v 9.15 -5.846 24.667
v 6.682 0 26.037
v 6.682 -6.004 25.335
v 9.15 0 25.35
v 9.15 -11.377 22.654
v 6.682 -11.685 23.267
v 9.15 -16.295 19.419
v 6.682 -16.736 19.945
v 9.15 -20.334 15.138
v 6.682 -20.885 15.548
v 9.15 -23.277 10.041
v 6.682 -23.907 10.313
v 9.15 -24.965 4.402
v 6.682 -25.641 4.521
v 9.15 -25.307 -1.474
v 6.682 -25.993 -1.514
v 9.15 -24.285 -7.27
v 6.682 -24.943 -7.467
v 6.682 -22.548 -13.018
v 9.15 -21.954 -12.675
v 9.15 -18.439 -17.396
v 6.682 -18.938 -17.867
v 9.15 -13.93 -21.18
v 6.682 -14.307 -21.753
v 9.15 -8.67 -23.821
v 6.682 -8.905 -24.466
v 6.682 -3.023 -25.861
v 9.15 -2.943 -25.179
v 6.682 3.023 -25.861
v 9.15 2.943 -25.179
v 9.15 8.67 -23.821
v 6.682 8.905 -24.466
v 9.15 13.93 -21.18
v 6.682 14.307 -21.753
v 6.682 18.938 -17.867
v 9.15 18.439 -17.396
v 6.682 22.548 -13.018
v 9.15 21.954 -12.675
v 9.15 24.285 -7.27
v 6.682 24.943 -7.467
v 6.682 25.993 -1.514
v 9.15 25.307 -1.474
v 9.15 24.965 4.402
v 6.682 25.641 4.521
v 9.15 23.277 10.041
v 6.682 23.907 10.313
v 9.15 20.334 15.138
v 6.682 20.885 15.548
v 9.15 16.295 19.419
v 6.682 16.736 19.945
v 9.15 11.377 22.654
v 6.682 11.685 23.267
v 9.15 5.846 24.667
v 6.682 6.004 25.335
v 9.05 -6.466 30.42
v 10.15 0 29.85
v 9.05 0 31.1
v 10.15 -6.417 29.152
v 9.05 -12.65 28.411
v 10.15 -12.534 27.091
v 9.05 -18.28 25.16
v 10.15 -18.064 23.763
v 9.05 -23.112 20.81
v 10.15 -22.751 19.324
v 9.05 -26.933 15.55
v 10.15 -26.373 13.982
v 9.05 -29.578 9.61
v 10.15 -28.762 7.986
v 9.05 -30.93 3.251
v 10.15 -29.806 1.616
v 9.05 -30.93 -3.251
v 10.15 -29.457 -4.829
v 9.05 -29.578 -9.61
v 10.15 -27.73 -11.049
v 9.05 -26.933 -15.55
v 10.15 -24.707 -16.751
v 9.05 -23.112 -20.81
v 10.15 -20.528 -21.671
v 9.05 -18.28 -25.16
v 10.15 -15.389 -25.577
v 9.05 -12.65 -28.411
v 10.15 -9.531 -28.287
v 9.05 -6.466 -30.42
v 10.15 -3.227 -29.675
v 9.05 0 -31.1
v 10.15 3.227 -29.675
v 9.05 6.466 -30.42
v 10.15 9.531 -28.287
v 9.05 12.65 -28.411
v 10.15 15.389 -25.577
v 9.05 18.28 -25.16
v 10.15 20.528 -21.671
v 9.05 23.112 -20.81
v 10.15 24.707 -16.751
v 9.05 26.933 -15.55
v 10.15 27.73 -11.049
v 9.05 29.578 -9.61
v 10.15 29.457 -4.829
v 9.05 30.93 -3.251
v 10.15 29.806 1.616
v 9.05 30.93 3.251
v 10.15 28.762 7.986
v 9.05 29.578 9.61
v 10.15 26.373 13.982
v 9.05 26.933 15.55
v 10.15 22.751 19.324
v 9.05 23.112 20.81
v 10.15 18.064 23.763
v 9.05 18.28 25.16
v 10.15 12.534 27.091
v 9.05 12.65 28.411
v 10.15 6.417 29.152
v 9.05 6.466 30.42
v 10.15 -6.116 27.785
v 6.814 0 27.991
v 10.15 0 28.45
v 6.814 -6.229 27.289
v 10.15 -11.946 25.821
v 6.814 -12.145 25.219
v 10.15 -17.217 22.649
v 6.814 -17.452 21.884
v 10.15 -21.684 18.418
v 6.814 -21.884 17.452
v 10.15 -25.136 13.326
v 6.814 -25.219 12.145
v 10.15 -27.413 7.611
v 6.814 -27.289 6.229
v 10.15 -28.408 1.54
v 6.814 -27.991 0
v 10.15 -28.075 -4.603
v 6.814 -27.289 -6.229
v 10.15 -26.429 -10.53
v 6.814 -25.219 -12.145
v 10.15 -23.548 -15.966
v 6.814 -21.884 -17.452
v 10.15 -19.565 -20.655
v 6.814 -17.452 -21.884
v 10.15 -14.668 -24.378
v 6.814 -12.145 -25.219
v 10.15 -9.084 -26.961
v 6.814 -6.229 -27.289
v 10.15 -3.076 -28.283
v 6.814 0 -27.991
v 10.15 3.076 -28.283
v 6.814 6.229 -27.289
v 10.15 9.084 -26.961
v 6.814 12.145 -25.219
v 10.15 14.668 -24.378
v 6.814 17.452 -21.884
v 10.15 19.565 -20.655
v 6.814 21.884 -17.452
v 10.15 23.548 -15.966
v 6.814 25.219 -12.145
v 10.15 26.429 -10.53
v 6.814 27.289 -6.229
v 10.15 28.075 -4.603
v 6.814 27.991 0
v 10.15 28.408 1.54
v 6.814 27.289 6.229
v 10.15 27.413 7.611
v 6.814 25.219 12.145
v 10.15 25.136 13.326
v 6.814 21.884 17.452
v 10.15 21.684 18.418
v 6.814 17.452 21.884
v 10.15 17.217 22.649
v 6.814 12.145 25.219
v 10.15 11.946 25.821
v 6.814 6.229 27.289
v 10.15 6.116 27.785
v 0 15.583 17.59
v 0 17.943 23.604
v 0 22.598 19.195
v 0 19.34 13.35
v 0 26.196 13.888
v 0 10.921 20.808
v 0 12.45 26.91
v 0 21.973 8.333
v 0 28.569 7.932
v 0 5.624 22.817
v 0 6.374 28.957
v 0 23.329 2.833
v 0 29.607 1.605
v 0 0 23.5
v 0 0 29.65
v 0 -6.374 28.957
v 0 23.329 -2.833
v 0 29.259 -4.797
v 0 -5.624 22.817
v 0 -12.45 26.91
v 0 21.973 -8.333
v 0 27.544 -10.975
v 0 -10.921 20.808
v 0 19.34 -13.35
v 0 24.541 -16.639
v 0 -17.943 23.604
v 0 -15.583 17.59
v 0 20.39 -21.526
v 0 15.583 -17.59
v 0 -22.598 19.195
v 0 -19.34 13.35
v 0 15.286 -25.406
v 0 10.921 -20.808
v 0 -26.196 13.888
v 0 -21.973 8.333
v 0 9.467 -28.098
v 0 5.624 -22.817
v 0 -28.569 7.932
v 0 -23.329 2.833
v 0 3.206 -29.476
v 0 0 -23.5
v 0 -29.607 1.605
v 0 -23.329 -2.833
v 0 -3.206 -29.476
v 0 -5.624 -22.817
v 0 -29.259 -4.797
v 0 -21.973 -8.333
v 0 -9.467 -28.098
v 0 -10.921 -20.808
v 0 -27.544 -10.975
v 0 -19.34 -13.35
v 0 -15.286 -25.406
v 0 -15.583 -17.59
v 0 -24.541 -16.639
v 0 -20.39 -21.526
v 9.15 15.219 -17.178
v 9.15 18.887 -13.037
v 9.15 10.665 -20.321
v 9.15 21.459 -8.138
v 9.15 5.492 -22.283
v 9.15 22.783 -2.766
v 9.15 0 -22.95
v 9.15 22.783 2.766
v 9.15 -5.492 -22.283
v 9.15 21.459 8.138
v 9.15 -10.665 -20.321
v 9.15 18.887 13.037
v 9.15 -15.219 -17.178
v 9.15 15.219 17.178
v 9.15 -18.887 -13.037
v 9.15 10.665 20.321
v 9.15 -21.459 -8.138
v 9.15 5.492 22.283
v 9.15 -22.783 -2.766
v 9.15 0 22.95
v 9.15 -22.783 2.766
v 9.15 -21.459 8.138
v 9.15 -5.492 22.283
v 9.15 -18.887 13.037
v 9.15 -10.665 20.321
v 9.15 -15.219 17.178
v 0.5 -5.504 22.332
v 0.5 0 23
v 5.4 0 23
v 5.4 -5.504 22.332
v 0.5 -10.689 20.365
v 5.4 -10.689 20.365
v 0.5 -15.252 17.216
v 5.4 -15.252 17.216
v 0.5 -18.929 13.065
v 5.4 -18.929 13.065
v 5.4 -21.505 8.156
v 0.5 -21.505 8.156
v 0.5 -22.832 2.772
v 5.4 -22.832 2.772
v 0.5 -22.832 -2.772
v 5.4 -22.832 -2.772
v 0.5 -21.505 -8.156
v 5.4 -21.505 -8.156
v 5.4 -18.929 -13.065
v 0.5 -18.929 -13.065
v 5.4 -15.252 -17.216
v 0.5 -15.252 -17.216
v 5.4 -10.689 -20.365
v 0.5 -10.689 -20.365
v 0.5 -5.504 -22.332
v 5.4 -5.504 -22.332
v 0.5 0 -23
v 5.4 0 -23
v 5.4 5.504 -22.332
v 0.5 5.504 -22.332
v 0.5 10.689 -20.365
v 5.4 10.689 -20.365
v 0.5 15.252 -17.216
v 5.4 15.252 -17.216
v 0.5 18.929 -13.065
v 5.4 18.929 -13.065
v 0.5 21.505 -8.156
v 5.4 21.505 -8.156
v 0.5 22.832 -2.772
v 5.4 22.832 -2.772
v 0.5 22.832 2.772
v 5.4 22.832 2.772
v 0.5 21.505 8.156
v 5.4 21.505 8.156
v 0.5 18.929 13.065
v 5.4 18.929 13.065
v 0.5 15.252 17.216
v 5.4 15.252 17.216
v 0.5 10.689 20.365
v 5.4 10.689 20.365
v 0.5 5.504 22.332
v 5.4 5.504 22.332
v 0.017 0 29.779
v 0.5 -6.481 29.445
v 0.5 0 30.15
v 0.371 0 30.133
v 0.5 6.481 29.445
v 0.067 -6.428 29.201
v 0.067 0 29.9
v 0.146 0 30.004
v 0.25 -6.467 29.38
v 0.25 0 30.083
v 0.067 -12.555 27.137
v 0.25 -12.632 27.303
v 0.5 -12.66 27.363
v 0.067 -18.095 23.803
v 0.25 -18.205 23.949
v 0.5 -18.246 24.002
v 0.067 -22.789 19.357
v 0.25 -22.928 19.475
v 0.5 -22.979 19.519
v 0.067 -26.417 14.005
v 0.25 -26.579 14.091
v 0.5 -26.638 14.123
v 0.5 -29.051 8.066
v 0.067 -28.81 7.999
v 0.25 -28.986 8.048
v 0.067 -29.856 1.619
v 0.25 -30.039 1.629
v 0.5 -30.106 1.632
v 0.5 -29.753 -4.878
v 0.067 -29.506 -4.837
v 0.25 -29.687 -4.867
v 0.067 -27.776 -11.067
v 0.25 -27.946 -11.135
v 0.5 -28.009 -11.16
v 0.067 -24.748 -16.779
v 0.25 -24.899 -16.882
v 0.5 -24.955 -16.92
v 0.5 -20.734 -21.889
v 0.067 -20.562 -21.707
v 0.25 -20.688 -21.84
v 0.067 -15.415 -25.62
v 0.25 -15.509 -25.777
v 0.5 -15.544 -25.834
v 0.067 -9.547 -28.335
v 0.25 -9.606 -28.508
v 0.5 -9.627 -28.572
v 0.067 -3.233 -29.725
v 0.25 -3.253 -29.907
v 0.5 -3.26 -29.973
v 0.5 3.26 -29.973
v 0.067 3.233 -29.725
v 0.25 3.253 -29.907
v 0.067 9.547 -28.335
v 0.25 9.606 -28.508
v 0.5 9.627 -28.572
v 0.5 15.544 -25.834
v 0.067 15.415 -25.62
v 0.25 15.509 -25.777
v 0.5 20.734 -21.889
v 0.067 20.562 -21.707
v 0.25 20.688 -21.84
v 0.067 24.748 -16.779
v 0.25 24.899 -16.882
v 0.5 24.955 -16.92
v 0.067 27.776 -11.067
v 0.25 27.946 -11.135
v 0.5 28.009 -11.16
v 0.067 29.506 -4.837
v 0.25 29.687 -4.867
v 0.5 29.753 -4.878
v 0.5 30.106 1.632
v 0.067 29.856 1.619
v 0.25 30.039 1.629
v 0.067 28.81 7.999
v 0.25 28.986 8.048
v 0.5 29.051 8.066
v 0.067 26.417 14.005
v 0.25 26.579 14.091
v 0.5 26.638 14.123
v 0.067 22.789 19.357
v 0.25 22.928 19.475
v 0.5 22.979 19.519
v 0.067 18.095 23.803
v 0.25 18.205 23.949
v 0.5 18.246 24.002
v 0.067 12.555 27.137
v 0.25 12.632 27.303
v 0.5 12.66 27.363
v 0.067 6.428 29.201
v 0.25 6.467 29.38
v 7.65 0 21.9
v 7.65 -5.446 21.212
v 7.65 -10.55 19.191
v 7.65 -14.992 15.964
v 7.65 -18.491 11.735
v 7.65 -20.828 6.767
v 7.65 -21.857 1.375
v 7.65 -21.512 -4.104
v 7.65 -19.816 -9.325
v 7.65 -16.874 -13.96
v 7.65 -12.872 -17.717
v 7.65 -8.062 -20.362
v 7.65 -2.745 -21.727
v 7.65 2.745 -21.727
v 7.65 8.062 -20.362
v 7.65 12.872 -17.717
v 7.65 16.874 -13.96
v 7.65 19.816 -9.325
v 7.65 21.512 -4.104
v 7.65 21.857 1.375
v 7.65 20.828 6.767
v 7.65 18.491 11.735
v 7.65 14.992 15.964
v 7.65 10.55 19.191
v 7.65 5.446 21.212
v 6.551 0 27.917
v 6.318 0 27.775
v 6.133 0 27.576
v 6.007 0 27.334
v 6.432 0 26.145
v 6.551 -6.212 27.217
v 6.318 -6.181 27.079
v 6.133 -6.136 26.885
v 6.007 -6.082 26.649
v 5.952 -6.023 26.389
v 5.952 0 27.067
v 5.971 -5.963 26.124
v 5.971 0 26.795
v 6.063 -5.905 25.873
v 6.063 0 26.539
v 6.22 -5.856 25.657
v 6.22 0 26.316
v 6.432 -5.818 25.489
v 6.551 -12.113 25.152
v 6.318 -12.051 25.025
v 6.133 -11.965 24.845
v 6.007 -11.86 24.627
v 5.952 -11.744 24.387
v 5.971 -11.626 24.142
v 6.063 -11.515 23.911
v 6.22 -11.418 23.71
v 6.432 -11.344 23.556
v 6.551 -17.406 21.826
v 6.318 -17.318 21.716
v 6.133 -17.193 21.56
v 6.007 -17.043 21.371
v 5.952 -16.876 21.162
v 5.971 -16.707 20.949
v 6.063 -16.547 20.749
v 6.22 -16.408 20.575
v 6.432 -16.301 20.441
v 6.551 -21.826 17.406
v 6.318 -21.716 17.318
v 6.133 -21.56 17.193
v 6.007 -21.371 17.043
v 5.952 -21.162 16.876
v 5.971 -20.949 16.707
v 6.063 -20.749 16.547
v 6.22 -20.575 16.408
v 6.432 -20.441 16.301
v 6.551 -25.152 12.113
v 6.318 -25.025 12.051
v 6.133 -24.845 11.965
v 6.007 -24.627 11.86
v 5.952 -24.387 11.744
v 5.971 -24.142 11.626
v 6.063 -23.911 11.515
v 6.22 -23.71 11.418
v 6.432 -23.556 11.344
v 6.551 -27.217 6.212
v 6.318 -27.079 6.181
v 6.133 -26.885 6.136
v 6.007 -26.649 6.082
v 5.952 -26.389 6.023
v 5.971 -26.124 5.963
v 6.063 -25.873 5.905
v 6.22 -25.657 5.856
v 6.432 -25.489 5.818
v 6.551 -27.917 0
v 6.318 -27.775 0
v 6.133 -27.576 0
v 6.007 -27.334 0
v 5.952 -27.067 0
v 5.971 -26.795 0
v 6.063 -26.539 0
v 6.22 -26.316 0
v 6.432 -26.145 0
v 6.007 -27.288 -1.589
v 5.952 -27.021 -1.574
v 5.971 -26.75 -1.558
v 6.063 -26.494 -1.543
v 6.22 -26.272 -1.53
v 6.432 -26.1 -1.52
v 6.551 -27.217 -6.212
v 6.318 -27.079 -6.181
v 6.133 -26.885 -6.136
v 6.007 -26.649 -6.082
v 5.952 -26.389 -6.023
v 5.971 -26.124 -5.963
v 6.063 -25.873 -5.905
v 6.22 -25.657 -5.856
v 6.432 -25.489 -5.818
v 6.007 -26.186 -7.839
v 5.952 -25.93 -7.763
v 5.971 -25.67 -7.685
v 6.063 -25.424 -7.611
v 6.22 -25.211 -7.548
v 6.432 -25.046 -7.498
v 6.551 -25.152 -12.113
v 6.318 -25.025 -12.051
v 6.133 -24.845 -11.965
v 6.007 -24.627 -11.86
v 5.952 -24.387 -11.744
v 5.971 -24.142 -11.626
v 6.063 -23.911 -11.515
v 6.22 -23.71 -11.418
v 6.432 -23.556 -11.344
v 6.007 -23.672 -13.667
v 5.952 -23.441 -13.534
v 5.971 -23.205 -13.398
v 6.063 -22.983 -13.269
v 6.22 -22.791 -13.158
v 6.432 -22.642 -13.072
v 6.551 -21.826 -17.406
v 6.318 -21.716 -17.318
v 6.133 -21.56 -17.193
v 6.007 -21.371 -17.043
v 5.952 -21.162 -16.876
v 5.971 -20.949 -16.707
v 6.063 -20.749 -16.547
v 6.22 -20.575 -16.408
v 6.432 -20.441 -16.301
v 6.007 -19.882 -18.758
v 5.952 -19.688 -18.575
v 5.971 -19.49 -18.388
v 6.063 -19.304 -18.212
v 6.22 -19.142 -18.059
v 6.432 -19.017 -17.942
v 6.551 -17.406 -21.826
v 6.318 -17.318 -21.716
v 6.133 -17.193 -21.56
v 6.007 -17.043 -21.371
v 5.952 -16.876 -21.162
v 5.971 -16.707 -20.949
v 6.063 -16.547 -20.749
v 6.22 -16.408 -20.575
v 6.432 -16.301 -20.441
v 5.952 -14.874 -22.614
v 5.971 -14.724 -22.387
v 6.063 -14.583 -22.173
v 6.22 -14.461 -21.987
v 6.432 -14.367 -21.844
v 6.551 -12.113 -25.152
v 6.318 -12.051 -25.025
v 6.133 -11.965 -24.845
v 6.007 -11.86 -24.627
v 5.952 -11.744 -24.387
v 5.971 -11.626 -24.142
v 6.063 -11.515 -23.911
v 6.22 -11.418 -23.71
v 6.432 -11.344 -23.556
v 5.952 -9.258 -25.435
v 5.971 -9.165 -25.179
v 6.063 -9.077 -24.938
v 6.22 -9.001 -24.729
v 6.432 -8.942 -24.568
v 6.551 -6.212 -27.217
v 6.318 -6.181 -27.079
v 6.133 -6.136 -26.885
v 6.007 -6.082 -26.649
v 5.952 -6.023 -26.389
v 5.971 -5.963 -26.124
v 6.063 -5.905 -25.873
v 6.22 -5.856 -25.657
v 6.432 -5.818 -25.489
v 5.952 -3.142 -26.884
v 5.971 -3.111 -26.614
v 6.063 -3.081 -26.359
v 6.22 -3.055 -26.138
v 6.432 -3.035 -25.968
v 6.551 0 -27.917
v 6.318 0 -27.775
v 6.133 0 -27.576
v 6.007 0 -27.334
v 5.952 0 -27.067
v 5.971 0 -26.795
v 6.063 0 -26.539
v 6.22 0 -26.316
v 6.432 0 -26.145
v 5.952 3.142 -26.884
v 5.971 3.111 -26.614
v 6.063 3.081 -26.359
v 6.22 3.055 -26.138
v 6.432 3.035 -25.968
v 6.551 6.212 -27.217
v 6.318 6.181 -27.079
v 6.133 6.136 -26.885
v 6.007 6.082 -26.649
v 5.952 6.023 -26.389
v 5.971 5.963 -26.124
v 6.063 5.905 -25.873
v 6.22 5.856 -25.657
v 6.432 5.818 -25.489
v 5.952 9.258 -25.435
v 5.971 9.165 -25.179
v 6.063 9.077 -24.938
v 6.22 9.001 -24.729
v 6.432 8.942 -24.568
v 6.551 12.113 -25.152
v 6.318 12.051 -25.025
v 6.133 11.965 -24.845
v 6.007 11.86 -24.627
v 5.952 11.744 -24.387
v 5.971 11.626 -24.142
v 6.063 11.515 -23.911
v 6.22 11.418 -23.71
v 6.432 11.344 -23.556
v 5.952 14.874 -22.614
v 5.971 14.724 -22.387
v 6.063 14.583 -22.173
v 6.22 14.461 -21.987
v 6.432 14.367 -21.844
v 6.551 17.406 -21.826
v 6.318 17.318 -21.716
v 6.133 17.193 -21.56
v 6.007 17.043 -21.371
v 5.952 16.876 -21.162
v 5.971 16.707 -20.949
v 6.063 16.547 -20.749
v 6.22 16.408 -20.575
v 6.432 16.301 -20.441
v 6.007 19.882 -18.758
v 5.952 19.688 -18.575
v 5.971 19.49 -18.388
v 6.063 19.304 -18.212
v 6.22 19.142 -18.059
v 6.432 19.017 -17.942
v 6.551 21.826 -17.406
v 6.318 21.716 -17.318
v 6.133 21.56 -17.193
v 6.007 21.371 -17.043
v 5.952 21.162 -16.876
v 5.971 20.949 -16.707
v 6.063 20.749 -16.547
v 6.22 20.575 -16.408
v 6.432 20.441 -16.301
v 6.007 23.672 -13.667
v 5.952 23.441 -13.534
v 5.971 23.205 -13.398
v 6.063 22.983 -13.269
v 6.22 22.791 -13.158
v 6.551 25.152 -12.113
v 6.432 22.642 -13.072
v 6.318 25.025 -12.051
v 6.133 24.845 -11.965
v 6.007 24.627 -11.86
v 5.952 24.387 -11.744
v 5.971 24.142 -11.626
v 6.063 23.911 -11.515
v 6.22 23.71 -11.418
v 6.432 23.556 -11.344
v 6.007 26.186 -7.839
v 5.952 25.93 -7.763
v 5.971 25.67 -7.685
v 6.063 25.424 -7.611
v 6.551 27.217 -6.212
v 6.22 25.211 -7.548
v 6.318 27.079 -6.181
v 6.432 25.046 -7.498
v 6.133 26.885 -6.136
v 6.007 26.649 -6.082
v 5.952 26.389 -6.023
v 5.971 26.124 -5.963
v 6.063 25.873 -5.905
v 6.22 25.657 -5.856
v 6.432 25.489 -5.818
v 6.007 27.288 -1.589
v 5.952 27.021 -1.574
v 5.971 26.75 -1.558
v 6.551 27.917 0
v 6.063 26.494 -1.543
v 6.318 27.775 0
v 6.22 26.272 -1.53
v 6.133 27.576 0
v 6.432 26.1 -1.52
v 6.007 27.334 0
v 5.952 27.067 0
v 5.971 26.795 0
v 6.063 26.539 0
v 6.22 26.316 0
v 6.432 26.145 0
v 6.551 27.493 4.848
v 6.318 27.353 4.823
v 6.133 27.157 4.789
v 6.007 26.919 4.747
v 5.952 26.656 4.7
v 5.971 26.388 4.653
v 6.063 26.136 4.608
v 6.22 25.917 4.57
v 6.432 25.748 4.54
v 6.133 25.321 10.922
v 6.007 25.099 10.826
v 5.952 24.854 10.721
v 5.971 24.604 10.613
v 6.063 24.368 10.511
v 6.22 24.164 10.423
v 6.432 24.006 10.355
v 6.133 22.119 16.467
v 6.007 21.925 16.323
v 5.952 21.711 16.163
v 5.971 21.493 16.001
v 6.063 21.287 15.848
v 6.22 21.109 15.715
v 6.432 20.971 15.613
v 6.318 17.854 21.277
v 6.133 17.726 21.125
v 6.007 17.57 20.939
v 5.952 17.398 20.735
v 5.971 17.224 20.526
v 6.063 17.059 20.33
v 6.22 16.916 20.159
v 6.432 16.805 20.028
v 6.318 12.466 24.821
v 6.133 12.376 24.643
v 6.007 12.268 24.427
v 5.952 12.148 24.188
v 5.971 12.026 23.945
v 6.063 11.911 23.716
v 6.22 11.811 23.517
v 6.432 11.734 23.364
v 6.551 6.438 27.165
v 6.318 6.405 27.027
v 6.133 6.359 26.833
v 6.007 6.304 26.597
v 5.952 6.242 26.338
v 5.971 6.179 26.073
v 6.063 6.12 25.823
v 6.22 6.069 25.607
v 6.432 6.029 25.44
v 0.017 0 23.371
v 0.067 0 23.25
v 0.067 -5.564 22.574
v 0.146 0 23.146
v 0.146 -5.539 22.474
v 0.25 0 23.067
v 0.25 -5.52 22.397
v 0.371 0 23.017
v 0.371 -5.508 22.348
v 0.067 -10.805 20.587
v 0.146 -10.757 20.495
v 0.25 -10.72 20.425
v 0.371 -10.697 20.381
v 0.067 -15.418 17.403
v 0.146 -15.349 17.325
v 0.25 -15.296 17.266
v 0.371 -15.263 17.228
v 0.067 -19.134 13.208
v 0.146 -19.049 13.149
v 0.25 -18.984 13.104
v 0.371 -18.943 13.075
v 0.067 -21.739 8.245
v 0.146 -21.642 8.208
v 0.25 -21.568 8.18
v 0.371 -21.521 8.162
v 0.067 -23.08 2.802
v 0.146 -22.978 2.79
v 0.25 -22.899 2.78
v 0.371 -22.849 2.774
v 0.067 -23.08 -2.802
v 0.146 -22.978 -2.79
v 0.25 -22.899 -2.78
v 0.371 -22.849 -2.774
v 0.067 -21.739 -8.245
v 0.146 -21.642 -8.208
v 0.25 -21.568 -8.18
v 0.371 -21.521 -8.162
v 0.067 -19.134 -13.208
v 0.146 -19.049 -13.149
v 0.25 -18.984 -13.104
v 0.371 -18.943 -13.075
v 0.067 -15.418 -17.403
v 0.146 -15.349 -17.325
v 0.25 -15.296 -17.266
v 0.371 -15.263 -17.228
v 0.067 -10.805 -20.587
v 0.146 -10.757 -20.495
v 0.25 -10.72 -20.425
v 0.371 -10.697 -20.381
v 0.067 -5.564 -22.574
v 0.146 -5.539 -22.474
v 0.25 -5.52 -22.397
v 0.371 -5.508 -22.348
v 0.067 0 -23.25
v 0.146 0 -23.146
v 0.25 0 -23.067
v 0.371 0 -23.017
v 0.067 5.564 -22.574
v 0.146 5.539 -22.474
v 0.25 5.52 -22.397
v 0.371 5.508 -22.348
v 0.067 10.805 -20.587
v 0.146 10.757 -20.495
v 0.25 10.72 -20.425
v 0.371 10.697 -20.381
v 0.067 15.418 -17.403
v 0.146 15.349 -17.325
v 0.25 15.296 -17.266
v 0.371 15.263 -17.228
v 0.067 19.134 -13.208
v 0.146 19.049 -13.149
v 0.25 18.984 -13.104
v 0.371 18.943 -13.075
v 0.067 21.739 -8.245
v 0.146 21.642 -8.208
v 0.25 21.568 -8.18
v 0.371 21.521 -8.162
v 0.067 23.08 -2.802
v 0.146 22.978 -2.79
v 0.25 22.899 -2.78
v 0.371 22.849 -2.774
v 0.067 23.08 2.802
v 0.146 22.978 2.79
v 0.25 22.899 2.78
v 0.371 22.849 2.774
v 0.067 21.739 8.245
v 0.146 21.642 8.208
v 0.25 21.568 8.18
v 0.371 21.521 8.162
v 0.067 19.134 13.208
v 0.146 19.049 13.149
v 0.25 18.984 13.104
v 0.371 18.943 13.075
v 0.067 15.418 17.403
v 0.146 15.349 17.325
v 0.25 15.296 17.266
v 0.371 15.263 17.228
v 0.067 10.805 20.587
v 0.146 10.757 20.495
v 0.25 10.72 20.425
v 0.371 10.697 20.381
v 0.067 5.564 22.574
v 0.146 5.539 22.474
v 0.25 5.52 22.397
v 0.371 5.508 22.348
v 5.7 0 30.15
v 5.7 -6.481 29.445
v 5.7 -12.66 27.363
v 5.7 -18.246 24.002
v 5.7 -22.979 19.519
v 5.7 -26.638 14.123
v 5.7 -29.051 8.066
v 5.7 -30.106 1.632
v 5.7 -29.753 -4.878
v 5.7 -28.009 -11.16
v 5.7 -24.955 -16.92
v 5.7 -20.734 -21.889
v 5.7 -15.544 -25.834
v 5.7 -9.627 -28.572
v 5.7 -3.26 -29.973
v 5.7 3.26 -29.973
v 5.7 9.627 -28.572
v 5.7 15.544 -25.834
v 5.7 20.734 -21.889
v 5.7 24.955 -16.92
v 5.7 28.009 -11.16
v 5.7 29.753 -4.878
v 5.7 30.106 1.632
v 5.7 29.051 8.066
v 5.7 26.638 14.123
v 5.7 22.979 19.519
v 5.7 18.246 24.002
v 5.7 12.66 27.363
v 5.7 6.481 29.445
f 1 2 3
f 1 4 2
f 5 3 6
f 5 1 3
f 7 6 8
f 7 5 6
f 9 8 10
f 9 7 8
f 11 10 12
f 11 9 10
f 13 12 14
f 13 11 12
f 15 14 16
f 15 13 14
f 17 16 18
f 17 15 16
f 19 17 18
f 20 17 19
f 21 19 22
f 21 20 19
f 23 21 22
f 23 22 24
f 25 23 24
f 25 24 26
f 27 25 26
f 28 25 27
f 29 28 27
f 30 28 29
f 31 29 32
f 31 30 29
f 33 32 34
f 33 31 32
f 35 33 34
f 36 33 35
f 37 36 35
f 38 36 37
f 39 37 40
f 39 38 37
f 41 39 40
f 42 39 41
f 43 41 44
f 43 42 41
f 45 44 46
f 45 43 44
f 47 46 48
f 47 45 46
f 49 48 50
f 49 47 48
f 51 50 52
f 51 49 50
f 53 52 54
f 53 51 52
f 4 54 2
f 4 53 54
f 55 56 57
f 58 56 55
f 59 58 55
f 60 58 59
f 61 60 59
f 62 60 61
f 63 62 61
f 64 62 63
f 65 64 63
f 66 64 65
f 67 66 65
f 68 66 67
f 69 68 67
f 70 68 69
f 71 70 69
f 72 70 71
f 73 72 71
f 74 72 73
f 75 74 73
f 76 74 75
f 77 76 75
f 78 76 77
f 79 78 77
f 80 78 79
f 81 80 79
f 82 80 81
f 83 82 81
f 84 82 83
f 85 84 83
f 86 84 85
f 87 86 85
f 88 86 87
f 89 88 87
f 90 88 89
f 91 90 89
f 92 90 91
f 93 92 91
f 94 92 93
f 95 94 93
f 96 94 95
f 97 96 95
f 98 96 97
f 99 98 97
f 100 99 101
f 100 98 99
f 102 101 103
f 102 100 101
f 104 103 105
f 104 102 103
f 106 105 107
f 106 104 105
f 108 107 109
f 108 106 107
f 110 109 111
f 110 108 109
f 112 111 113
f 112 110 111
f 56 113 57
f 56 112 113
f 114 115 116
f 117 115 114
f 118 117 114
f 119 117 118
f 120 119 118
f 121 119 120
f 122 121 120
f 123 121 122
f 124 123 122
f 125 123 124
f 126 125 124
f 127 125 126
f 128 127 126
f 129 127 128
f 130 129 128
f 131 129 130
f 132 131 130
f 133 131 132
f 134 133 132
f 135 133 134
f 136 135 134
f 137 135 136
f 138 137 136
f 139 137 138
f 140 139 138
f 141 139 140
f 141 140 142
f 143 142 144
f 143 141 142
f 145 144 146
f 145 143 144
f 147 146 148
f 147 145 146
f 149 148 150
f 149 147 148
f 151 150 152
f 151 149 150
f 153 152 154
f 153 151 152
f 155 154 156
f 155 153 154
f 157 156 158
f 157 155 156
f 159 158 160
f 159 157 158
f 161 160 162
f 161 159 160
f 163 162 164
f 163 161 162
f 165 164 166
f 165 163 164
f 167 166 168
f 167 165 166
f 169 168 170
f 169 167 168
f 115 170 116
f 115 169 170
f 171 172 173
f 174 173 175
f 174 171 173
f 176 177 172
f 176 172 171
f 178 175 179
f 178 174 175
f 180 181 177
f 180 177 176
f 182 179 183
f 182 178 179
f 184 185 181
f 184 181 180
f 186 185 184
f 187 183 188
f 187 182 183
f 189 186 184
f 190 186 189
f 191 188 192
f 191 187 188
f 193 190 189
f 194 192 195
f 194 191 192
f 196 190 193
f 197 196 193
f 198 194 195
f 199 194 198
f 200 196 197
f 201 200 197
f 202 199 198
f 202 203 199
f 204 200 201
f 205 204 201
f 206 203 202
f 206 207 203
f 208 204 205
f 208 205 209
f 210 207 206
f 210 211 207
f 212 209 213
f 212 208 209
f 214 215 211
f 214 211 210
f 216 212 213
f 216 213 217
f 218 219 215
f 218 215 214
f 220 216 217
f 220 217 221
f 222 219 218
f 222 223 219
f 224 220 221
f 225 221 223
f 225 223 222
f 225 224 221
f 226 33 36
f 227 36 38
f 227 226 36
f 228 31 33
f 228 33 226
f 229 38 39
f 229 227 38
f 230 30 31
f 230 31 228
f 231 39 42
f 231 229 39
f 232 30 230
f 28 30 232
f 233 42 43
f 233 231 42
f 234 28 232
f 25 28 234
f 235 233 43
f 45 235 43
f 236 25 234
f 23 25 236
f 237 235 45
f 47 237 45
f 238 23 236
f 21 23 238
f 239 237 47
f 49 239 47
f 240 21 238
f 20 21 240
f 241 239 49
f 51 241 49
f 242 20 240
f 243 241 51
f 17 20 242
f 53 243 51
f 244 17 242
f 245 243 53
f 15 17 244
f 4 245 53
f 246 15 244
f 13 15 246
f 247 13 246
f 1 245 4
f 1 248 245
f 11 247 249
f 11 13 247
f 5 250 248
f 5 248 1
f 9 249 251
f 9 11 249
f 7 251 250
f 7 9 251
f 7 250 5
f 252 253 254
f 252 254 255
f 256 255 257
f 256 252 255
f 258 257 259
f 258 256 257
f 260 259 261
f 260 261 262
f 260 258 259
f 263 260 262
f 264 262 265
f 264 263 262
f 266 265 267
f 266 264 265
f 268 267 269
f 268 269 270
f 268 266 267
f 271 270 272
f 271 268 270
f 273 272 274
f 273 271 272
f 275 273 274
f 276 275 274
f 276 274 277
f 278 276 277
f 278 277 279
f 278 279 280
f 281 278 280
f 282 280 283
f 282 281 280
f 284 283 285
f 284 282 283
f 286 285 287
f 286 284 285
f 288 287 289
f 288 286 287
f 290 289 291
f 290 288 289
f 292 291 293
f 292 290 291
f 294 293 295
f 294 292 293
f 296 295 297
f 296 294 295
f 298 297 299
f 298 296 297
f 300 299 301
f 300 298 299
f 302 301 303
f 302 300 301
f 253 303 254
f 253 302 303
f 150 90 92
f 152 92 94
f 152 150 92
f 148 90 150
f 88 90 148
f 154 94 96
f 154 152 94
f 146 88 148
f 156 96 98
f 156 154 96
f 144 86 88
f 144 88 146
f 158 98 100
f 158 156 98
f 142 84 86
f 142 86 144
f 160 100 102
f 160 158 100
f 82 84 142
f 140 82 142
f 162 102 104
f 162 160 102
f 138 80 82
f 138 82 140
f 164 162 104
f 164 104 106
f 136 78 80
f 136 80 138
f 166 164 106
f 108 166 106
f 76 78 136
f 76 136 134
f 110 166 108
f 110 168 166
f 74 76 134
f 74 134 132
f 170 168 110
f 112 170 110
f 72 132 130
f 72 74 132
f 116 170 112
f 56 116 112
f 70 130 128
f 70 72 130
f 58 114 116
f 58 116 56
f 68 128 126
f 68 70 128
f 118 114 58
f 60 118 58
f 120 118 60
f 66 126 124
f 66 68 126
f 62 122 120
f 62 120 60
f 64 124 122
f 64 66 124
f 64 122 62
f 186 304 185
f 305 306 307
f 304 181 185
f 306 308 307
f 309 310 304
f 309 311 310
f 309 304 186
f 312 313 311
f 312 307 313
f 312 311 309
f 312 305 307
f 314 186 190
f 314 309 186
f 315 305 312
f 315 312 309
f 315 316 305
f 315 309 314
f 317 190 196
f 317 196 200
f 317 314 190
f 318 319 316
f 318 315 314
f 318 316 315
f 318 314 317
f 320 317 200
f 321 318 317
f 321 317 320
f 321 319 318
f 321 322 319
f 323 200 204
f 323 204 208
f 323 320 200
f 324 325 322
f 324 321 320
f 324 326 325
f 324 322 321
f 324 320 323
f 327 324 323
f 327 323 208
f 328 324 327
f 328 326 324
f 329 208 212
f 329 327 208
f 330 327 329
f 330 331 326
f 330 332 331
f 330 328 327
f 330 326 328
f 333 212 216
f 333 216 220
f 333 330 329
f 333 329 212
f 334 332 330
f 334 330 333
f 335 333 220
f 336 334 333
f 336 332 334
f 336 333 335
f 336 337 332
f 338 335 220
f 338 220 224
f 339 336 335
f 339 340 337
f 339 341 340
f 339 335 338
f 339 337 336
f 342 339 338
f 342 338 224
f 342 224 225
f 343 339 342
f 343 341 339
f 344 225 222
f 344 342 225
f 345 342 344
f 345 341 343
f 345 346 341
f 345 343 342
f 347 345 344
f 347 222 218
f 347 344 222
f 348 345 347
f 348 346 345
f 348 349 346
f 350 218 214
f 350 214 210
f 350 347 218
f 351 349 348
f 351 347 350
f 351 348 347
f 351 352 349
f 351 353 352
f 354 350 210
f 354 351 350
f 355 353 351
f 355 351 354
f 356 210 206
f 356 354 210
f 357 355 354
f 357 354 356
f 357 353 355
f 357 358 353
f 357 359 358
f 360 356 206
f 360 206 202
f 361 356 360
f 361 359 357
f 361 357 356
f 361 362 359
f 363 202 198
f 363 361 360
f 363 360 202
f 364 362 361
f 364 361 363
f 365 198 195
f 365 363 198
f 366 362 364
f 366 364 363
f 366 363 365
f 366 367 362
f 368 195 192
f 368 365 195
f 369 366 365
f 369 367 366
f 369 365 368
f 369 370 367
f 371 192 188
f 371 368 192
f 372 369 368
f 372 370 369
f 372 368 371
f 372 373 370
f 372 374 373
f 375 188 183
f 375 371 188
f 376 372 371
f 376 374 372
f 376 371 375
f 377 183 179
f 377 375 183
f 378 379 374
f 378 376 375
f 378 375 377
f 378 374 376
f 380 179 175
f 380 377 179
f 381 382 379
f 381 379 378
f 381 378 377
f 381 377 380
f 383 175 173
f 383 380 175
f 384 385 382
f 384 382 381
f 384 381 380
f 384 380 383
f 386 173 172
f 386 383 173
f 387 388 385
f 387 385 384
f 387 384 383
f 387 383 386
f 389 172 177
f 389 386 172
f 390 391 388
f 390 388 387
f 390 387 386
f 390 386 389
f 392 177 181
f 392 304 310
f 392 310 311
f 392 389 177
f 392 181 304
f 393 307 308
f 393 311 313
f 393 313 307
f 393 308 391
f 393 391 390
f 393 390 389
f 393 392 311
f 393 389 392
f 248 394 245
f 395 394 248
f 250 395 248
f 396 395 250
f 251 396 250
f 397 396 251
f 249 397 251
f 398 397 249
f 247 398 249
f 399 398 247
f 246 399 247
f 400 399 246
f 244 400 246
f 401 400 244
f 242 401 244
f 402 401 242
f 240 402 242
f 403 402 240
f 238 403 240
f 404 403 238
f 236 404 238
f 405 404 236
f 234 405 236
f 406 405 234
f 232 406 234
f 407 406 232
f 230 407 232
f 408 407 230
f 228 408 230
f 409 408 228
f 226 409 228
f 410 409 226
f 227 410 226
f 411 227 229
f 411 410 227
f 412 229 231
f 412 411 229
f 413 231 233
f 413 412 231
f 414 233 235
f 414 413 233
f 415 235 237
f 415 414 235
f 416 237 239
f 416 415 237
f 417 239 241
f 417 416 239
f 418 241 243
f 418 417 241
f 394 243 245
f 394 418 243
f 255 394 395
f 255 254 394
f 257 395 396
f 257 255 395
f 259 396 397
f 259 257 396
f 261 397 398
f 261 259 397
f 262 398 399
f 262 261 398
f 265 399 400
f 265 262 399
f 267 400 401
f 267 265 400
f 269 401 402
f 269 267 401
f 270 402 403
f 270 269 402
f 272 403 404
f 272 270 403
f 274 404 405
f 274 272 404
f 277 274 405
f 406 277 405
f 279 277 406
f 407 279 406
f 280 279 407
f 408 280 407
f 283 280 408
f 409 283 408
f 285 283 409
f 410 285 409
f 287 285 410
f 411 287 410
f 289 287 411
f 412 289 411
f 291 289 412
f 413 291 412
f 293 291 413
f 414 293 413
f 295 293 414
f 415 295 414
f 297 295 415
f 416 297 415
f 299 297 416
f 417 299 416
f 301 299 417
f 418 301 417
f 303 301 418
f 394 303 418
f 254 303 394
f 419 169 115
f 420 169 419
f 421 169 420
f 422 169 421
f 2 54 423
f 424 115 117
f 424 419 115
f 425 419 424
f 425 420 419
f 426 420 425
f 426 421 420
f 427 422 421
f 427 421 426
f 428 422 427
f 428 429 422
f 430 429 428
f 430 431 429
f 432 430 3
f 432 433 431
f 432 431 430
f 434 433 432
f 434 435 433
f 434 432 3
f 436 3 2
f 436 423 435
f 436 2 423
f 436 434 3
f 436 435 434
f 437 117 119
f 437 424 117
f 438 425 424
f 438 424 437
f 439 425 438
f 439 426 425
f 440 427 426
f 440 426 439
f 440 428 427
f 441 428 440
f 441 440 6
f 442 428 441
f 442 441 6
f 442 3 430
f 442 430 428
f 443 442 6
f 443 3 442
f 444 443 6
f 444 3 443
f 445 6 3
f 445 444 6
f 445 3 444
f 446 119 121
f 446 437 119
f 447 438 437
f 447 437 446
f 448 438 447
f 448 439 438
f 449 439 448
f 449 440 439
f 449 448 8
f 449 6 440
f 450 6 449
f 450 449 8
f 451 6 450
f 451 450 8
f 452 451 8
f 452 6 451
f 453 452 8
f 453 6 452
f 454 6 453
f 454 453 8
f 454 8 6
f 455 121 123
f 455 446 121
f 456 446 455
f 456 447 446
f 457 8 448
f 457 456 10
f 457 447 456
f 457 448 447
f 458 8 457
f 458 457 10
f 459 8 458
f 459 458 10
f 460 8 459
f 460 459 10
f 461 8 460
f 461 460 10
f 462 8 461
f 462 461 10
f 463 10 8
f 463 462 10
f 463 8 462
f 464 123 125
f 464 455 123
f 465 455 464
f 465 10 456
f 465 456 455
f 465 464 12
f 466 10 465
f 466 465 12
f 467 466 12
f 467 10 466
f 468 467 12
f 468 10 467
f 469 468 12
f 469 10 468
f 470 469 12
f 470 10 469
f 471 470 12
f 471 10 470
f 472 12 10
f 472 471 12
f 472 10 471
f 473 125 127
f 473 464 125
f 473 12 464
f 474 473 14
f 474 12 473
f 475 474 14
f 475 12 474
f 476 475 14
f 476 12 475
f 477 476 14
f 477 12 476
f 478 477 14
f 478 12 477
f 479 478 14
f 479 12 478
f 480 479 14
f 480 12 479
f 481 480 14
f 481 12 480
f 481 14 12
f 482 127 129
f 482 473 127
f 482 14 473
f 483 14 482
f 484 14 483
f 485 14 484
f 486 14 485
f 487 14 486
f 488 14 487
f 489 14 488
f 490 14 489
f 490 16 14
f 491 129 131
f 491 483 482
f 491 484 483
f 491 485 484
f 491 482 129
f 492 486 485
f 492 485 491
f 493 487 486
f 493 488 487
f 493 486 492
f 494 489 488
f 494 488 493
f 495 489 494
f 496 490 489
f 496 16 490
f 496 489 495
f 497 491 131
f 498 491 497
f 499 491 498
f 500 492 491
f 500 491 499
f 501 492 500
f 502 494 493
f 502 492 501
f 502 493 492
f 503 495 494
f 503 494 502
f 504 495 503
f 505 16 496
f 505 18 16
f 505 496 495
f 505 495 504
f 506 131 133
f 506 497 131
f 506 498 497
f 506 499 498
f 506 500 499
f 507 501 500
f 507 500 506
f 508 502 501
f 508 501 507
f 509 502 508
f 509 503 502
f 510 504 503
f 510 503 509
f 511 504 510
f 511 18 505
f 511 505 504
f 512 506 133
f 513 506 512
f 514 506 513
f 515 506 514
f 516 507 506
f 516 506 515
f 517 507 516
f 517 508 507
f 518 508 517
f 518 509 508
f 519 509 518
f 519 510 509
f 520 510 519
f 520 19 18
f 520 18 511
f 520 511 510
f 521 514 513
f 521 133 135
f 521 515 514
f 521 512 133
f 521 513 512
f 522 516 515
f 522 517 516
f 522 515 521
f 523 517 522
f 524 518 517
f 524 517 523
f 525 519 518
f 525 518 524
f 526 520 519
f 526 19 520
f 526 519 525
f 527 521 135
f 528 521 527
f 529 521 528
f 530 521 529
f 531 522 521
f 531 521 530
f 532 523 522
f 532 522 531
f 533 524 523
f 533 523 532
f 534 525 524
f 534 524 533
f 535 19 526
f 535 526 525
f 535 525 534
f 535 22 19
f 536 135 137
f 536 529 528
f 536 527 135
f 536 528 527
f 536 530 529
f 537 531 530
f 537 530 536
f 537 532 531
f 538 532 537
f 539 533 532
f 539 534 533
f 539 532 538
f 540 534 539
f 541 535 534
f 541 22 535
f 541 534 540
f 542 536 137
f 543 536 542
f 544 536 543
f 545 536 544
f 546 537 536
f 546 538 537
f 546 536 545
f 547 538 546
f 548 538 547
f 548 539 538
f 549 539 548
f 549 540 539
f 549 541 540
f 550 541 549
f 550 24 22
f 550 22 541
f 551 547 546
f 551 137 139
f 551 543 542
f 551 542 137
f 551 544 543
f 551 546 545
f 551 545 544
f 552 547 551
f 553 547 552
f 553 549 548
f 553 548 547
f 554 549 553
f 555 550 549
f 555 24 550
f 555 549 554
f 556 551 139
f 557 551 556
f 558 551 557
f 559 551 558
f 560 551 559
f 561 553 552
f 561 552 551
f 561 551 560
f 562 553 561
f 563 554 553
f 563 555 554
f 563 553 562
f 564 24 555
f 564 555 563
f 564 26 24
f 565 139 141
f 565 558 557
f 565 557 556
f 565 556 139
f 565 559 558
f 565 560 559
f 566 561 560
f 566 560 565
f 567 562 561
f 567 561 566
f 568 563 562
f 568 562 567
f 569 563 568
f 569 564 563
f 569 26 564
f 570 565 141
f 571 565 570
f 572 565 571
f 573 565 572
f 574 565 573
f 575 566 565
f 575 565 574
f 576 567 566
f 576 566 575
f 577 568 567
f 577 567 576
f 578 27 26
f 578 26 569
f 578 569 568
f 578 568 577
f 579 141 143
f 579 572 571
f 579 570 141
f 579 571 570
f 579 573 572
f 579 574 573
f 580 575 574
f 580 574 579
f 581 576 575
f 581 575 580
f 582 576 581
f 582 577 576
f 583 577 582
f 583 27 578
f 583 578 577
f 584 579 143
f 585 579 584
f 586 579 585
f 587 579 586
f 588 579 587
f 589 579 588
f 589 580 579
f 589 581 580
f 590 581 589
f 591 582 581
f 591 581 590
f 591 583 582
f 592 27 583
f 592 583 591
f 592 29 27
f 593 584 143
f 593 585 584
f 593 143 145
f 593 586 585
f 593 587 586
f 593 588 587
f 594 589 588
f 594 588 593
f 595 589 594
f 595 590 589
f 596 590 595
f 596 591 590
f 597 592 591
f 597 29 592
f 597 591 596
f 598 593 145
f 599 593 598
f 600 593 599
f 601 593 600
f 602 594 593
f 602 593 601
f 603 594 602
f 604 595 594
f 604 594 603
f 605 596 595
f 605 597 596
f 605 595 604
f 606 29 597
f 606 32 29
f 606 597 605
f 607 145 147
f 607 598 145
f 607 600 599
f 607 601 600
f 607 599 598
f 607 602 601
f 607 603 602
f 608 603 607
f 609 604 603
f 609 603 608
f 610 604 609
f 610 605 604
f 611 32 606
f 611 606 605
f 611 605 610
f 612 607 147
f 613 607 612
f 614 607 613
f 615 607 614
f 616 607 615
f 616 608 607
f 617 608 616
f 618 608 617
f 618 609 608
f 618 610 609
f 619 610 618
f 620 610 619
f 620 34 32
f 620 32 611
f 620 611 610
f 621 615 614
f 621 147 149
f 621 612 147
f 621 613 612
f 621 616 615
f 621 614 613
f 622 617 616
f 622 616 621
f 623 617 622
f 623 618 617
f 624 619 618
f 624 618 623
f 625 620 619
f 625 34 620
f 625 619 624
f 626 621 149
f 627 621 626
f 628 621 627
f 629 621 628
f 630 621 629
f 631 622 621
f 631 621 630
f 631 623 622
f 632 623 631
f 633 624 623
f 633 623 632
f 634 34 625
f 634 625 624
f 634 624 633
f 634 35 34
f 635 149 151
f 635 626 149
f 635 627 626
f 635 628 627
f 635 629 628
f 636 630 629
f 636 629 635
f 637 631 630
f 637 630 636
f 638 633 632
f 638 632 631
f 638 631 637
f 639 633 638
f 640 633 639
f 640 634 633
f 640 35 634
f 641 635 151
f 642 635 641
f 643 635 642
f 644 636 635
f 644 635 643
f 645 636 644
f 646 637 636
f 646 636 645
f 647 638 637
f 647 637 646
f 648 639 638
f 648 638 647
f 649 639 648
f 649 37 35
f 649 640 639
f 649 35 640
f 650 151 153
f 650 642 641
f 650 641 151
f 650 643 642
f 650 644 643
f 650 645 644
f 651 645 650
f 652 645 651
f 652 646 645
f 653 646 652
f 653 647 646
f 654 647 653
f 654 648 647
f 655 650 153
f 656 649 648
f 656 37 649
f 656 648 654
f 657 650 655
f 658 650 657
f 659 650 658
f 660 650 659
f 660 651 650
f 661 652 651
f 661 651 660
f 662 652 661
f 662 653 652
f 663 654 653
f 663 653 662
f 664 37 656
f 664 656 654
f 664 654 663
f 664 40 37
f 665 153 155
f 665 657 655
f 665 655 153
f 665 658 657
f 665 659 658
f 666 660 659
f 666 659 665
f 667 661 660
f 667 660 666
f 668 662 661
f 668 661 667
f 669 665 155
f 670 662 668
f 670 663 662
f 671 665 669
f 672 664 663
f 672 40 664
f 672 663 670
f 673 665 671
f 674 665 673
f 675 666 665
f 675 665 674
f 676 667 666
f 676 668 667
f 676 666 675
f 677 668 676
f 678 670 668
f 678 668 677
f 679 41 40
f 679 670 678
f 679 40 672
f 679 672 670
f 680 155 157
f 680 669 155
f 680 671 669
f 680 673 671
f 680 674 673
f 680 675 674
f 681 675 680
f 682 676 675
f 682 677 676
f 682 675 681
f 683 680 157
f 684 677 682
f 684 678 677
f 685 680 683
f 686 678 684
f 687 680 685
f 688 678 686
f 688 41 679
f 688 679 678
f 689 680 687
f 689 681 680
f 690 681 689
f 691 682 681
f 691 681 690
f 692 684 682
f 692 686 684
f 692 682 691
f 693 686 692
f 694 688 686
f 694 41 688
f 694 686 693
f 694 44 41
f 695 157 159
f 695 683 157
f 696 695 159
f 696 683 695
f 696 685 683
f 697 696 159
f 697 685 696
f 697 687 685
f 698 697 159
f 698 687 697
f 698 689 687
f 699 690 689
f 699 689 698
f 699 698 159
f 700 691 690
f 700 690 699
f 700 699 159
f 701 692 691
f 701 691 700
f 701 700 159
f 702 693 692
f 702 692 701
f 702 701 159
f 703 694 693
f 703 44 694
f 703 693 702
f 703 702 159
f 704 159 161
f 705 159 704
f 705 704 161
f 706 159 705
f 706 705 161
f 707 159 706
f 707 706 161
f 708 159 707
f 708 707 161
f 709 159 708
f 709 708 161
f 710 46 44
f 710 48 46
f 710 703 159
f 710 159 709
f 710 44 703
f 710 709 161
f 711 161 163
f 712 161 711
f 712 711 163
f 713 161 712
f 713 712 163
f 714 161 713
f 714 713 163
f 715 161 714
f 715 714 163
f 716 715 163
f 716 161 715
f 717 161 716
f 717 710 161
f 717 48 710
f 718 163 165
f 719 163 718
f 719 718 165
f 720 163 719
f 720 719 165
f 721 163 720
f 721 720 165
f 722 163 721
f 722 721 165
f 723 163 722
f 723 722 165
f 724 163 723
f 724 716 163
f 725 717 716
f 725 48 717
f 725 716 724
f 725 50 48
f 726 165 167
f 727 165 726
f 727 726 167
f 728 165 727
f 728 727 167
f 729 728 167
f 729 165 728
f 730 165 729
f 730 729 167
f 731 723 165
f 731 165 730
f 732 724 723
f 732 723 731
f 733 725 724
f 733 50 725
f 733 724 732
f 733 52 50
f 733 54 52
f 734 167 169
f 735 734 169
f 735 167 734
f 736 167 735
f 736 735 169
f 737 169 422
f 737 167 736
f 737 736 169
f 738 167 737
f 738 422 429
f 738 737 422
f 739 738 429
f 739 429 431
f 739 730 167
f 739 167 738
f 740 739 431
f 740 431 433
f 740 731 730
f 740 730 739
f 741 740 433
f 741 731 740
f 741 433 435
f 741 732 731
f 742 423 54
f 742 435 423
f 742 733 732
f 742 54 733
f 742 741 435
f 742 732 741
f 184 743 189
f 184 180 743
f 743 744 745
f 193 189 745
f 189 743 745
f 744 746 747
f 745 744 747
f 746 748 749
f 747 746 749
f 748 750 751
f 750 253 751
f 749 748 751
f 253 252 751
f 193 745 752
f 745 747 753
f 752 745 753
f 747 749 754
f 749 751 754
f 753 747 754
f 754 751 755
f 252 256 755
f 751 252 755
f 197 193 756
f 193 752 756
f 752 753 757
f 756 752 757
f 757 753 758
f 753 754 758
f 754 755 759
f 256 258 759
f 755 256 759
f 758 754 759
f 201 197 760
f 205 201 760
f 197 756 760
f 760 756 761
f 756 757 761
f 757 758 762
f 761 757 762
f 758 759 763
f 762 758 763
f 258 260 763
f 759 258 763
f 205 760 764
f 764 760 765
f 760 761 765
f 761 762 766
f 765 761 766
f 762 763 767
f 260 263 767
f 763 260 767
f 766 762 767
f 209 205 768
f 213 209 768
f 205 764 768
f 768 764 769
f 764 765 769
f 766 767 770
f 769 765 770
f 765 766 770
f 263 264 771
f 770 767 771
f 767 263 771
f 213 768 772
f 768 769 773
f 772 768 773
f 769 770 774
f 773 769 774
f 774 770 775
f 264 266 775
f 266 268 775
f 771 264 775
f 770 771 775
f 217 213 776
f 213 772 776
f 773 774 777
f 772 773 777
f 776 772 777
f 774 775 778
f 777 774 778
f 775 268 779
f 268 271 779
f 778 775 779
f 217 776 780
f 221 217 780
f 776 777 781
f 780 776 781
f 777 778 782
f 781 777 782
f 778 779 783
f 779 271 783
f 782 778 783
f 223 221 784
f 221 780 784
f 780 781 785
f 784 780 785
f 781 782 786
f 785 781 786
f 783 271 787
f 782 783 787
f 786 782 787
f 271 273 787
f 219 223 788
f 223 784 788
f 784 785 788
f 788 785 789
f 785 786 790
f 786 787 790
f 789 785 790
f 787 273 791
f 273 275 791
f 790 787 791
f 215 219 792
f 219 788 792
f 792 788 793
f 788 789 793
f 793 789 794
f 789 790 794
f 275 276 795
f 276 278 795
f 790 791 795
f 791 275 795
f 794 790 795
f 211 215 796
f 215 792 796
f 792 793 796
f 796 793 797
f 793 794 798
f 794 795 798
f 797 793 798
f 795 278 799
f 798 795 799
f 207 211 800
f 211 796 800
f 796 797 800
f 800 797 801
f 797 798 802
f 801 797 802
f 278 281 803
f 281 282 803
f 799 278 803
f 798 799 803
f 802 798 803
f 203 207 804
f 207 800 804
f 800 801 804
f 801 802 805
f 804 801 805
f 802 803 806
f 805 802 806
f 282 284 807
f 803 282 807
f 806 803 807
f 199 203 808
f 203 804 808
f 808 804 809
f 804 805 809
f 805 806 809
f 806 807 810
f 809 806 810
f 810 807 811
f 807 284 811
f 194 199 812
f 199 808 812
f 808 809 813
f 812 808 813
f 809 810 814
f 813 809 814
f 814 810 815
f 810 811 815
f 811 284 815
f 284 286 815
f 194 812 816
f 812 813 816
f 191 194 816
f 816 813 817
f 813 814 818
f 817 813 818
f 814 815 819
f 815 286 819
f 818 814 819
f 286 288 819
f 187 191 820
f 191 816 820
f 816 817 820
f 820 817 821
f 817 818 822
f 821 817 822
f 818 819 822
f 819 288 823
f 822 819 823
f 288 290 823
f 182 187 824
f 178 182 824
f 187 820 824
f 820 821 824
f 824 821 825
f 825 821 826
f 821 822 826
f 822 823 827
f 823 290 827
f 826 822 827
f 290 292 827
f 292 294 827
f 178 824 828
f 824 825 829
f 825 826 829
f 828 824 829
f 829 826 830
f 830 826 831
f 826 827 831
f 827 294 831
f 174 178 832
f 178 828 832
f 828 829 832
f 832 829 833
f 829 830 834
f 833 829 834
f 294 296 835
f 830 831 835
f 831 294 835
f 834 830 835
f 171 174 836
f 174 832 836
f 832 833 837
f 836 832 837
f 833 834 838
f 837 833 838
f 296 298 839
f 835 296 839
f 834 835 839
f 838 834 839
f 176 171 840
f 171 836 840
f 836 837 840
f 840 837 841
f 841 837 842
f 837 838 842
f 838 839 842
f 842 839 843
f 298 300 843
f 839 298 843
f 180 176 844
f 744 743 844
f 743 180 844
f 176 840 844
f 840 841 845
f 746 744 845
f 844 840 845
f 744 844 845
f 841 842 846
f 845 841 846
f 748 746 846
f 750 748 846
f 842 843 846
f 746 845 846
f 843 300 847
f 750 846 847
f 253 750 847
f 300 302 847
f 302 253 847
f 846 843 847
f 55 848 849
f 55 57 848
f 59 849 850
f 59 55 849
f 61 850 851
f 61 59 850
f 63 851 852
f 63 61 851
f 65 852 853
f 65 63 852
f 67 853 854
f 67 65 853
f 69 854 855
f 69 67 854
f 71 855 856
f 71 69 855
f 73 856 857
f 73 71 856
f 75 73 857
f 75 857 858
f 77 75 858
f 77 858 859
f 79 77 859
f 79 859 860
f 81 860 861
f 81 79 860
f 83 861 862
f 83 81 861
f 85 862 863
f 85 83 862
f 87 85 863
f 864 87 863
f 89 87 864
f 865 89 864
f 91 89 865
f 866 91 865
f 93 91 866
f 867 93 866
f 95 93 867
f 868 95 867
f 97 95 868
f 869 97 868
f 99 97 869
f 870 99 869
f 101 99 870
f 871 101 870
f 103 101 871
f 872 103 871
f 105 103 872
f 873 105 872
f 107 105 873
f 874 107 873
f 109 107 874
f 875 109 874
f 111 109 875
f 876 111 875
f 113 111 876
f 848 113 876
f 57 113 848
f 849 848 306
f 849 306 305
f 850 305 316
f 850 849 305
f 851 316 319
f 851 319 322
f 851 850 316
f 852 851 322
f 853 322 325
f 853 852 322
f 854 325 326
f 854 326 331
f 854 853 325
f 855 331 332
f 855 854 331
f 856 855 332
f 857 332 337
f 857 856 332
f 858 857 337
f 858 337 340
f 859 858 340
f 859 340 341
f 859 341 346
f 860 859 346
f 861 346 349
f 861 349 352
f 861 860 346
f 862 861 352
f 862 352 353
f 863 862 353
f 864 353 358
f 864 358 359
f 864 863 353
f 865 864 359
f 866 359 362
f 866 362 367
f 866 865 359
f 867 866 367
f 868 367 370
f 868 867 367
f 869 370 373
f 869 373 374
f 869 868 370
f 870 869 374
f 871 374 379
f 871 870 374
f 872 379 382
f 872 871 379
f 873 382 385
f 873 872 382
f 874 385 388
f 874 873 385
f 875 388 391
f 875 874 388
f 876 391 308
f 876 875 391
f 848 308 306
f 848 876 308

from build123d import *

# Parameters (mm, degrees)
FILLET1_R = 0.5


with BuildPart() as part:
    # Sketch1 → Revolve1 (revolve)
    with BuildSketch(Plane.XY, mode=Mode.PRIVATE) as revolve1_sk:
        with BuildLine():
            Line((0, 23), (0, 30.15))
            Line((0, 30.15), (5.7, 30.15))
            Line((5.7, 30.15), (9.05, 31.1))
            Line((9.05, 31.1), (10.15, 29.85))
            Line((10.15, 29.85), (10.15, 28.45))
            Line((10.15, 28.45), (6.813609391, 27.990655138))
            ThreePointArc((6.813609391, 27.990655138), (5.952260951, 27.067207064), (6.681984504, 26.036585399))
            Line((6.681984504, 26.036585399), (9.15, 25.35))
            Line((9.15, 25.35), (9.15, 22.95))
            Line((9.15, 22.95), (7.65, 21.9))
            Line((7.65, 21.9), (5.4, 23))
            Line((5.4, 23), (0, 23))
        make_face()
    revolve(revolve1_sk.sketch.rotate(Axis((0, 0, 0), (1, 0, 0)), 90), axis=Axis((0, 0, 0), (1, 0, 0)))

    # Fillet1
    fillet1_edges = [part.edges().sort_by_distance(p)[0] for p in [
        (0, 0, -30.15),
        (0, 0, -23),
    ]]
    fillet(fillet1_edges, radius=FILLET1_R)


solid = part.part
